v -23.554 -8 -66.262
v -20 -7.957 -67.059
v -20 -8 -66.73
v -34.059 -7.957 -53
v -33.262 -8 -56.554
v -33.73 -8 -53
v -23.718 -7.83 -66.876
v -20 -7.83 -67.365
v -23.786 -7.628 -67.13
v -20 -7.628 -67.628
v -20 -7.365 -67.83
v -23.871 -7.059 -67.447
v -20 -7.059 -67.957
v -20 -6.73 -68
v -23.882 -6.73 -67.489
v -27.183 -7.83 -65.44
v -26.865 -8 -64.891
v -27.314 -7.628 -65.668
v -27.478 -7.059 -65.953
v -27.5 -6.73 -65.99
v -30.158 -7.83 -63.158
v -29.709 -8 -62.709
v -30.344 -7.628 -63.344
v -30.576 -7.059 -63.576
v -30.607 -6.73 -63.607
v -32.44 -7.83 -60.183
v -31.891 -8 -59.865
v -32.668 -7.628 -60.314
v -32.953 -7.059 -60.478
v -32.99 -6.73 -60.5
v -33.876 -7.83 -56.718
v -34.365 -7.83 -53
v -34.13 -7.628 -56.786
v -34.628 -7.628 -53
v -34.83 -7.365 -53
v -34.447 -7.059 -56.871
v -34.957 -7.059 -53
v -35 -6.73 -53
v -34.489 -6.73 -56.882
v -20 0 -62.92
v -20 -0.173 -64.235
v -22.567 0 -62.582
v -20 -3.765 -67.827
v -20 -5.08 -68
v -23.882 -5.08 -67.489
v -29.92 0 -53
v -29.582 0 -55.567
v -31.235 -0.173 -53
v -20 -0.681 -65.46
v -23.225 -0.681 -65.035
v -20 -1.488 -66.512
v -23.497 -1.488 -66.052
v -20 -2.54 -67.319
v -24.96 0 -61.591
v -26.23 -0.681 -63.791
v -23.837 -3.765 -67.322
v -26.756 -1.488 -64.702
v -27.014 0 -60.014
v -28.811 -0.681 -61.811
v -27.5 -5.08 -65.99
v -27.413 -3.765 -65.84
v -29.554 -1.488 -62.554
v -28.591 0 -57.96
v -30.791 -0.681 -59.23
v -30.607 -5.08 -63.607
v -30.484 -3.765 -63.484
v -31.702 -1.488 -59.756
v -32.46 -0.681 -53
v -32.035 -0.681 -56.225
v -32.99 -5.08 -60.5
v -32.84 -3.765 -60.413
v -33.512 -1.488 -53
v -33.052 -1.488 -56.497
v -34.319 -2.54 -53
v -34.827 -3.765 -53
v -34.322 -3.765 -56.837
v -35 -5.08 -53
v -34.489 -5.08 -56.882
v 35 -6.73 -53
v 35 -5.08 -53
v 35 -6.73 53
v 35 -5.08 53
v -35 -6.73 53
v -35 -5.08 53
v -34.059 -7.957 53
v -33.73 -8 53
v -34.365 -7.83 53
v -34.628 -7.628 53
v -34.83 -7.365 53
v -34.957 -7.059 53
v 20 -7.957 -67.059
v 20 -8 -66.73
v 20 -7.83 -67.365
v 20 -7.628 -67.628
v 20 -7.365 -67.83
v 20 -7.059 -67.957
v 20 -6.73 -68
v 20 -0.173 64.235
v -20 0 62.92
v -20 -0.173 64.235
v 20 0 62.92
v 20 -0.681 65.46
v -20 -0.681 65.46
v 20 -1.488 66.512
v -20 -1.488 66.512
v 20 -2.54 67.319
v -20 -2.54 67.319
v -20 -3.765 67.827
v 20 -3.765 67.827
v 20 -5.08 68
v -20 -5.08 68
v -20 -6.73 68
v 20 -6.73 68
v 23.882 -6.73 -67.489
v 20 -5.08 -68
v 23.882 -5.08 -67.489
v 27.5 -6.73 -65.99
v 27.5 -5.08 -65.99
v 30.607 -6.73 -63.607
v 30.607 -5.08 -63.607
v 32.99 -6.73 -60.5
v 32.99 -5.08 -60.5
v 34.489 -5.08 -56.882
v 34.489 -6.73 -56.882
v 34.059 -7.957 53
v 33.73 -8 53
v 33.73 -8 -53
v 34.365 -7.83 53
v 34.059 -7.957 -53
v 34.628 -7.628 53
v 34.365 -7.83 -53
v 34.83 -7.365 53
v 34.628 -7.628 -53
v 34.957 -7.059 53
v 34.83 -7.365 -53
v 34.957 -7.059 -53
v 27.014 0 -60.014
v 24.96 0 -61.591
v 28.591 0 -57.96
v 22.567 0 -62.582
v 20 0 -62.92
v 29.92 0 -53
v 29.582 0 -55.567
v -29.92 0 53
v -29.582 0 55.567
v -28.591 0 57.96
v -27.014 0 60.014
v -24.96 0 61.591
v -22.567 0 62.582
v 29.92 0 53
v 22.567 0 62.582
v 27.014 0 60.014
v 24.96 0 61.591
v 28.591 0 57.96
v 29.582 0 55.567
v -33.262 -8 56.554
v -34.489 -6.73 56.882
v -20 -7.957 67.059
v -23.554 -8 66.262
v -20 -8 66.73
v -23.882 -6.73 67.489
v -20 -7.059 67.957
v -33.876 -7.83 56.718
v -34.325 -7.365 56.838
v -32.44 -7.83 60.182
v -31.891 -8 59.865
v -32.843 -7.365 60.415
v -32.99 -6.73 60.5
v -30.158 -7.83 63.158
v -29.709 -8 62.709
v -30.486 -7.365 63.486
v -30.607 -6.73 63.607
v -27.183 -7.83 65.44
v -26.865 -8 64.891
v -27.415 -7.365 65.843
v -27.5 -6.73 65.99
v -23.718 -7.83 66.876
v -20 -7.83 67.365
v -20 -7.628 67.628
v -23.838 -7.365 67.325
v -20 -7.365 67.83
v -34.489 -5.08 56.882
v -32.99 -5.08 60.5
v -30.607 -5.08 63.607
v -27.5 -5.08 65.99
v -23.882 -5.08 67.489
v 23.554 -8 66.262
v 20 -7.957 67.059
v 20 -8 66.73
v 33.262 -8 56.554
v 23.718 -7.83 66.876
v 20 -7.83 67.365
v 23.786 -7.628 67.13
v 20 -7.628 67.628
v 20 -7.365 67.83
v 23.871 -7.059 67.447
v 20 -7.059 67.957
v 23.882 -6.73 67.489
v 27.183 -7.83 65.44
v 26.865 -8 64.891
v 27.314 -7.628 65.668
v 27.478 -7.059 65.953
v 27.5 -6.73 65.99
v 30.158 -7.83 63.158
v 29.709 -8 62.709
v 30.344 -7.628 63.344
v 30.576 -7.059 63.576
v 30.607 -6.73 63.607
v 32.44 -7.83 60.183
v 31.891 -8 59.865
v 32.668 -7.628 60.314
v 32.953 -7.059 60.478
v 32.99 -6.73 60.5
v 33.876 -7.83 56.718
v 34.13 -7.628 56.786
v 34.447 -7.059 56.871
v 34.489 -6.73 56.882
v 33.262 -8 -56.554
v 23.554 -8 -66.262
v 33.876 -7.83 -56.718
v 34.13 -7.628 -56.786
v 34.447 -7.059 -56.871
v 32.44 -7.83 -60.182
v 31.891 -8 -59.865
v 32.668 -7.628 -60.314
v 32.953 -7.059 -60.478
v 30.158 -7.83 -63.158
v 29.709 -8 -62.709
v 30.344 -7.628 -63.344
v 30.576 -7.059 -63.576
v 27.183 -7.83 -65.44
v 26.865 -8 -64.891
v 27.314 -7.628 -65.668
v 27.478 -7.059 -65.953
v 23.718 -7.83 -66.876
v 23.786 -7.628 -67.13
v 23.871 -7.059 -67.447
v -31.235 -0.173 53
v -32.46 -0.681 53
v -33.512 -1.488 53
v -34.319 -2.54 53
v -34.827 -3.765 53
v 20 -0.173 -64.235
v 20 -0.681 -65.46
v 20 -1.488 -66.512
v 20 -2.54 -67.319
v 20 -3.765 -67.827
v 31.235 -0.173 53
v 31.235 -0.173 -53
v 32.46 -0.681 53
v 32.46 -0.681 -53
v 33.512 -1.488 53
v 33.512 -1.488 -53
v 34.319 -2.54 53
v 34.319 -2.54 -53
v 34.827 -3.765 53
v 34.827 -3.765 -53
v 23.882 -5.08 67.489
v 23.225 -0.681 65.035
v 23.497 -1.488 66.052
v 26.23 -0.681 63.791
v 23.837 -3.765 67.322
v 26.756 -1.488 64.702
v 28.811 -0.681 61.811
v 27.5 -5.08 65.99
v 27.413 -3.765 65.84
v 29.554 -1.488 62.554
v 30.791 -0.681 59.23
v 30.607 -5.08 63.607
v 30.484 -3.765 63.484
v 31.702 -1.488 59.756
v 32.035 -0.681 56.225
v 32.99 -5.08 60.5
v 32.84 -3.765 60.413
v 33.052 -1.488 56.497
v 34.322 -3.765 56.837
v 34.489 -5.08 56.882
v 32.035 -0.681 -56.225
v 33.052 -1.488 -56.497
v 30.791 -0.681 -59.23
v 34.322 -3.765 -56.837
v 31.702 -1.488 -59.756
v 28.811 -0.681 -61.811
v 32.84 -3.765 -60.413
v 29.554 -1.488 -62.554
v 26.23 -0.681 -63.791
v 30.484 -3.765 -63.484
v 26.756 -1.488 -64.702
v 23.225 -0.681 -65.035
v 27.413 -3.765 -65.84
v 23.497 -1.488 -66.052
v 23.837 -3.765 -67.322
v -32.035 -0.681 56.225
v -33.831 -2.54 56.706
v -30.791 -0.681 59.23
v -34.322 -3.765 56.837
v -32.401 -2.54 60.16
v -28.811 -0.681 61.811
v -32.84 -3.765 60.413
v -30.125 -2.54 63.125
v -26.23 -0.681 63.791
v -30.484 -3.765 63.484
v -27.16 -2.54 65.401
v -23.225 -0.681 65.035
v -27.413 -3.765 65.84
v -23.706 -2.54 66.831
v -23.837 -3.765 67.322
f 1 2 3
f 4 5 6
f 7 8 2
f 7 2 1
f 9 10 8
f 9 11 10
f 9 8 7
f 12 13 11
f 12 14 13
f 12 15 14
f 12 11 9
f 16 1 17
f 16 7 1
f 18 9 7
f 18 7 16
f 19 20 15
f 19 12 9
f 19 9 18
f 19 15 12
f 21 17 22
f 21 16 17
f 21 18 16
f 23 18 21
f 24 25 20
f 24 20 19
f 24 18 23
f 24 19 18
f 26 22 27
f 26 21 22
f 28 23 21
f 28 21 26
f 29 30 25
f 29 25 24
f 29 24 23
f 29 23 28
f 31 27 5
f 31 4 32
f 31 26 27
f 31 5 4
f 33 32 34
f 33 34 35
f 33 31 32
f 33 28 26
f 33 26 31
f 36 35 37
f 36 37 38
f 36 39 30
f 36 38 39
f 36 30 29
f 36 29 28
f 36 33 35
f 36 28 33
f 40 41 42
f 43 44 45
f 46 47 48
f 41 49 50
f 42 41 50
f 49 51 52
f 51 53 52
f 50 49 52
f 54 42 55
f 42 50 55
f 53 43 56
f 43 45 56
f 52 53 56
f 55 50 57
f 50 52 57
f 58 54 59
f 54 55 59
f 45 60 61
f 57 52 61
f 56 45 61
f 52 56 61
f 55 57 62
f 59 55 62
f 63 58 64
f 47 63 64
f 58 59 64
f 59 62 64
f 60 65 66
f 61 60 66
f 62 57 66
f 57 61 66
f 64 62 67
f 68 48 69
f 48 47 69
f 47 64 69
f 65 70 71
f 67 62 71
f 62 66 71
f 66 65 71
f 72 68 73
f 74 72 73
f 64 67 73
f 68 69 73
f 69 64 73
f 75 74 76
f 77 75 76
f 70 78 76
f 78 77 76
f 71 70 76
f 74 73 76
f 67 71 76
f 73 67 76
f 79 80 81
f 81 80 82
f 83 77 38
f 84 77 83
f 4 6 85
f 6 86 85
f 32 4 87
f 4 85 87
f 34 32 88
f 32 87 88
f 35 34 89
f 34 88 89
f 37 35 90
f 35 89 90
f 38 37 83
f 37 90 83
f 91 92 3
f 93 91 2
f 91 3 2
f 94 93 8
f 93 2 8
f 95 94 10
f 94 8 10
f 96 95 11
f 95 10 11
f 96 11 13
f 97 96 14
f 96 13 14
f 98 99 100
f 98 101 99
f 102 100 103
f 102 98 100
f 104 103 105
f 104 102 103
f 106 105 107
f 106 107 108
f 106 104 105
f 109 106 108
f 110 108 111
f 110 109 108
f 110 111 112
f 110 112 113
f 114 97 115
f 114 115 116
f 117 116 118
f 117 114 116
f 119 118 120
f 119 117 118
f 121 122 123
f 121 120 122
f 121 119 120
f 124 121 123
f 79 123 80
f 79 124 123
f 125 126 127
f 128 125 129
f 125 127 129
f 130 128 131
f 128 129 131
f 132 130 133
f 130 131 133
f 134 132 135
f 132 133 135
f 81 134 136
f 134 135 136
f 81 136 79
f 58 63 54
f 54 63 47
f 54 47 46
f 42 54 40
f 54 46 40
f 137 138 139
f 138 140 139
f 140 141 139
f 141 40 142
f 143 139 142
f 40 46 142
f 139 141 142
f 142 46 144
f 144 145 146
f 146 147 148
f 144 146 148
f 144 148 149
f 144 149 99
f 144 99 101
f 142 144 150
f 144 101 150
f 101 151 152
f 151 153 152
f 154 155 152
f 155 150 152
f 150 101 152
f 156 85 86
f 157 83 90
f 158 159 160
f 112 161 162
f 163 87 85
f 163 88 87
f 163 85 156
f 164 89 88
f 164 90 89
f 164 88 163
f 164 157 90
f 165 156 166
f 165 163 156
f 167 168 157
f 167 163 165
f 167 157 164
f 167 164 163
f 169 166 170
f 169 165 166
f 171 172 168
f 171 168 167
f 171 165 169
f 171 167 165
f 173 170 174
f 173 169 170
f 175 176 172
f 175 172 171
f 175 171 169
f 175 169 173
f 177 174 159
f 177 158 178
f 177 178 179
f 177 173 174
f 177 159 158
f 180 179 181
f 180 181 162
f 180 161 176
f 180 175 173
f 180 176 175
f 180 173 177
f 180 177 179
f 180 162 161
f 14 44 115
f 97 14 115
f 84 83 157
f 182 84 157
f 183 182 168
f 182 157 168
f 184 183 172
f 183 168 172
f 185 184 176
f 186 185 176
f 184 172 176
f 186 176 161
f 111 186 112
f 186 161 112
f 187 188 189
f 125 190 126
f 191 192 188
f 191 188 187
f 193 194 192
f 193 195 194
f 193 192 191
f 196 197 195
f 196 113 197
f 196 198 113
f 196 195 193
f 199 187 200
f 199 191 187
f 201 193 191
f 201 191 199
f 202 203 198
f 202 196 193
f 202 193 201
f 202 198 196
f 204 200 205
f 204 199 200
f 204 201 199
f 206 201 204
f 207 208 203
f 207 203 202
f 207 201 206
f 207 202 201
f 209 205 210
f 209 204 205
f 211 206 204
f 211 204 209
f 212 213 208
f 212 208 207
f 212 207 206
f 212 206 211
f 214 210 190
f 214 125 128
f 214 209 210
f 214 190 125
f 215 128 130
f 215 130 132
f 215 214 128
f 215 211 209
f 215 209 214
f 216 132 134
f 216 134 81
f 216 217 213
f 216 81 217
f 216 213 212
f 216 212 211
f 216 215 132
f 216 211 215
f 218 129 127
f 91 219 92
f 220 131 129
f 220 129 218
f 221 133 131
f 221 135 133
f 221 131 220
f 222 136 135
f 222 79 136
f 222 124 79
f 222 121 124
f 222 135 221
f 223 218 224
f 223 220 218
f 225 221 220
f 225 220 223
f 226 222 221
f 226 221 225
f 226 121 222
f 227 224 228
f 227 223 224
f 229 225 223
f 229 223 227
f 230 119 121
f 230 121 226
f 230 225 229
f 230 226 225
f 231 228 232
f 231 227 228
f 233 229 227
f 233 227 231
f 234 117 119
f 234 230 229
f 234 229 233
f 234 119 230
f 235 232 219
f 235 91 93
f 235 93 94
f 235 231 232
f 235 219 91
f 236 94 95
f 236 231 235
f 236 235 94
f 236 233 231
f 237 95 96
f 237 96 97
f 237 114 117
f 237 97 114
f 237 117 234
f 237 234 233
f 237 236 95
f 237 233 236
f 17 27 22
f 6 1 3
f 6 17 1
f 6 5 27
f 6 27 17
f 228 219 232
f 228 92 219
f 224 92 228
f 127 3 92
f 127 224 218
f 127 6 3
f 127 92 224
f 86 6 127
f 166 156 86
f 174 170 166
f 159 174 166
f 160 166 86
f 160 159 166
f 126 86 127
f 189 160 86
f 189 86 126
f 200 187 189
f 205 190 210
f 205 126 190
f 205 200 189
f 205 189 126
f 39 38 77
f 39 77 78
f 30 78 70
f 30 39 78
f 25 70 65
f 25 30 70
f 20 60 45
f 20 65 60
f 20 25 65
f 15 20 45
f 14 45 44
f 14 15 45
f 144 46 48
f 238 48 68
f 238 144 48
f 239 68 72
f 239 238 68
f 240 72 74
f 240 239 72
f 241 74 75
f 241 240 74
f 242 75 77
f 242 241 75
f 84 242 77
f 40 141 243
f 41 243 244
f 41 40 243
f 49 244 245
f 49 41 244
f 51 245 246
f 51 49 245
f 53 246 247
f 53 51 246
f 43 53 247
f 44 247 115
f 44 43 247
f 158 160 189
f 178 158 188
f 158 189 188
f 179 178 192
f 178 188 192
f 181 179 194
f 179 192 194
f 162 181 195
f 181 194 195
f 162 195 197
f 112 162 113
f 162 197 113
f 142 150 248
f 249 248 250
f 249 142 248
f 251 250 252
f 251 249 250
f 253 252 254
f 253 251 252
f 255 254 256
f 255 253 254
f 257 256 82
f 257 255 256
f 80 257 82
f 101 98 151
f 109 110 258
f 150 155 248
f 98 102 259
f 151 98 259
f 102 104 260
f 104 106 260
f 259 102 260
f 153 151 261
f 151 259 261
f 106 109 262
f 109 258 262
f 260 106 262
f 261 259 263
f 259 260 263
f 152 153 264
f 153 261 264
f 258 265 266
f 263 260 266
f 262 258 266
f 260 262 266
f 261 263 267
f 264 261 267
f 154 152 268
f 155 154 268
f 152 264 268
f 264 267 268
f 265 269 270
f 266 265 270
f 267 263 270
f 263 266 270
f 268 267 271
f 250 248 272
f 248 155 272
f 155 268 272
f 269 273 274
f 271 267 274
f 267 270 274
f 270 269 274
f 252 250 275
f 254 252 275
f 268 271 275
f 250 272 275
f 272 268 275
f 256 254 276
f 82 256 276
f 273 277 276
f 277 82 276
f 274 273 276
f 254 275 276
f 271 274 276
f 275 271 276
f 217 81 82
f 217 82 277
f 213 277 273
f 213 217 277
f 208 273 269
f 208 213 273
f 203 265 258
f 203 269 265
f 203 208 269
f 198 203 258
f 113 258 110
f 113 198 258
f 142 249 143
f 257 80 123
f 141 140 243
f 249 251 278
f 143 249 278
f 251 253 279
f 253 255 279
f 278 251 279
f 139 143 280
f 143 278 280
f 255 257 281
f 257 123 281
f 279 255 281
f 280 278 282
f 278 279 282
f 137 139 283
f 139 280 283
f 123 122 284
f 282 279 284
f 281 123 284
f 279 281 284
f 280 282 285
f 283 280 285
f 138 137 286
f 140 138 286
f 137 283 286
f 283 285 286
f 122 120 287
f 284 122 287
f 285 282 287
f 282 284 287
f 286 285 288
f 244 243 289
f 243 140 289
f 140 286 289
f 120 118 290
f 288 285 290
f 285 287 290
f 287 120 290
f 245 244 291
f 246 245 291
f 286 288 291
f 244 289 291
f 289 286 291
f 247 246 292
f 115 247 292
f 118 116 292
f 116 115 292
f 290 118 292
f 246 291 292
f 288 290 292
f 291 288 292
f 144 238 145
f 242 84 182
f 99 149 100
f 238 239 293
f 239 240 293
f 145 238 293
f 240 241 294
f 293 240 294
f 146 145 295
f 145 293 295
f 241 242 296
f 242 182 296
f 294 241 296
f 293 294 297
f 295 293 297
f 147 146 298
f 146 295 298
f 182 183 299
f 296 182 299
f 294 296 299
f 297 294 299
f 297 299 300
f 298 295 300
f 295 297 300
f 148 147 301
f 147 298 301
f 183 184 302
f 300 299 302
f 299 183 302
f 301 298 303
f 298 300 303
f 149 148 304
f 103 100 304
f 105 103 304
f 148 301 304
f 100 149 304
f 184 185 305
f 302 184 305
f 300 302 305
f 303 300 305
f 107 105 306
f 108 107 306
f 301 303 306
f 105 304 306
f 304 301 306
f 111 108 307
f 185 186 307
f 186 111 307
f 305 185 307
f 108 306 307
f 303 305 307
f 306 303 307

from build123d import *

# Parameters (mm, degrees)
F0_W     = 70
F0_H     = 136
F1_DEPTH = 8
F2_R     = 15
F3_R     = 5.08
F4_R     = 1.27


with BuildPart() as f1:
    # F0 (on Front) → F1 (new body)
    with BuildSketch(Plane.XZ):
        Rectangle(F0_W, F0_H)
    extrude(amount=F1_DEPTH)

    # F2
    f2_edges = [f1.edges().sort_by_distance(p)[0] for p in [
        (35, -4, 68),
        (-35, -4, 68),
        (35, -4, -68),
        (-35, -4, -68),
    ]]
    fillet(f2_edges, radius=F2_R)

    # F3
    f3_edges = [f1.edges().sort_by_distance(p)[0] for p in [
        (0, 0, 68),
        (30.606602, 0, 63.606602),
    ]]
    fillet(f3_edges, radius=F3_R)

    # F4
    f4_edges = [f1.edges().sort_by_distance(p)[0] for p in [
        (-30.606602, -8, 63.606602),
        (0, -8, 68),
    ]]
    fillet(f4_edges, radius=F4_R)


solid = f1.part
